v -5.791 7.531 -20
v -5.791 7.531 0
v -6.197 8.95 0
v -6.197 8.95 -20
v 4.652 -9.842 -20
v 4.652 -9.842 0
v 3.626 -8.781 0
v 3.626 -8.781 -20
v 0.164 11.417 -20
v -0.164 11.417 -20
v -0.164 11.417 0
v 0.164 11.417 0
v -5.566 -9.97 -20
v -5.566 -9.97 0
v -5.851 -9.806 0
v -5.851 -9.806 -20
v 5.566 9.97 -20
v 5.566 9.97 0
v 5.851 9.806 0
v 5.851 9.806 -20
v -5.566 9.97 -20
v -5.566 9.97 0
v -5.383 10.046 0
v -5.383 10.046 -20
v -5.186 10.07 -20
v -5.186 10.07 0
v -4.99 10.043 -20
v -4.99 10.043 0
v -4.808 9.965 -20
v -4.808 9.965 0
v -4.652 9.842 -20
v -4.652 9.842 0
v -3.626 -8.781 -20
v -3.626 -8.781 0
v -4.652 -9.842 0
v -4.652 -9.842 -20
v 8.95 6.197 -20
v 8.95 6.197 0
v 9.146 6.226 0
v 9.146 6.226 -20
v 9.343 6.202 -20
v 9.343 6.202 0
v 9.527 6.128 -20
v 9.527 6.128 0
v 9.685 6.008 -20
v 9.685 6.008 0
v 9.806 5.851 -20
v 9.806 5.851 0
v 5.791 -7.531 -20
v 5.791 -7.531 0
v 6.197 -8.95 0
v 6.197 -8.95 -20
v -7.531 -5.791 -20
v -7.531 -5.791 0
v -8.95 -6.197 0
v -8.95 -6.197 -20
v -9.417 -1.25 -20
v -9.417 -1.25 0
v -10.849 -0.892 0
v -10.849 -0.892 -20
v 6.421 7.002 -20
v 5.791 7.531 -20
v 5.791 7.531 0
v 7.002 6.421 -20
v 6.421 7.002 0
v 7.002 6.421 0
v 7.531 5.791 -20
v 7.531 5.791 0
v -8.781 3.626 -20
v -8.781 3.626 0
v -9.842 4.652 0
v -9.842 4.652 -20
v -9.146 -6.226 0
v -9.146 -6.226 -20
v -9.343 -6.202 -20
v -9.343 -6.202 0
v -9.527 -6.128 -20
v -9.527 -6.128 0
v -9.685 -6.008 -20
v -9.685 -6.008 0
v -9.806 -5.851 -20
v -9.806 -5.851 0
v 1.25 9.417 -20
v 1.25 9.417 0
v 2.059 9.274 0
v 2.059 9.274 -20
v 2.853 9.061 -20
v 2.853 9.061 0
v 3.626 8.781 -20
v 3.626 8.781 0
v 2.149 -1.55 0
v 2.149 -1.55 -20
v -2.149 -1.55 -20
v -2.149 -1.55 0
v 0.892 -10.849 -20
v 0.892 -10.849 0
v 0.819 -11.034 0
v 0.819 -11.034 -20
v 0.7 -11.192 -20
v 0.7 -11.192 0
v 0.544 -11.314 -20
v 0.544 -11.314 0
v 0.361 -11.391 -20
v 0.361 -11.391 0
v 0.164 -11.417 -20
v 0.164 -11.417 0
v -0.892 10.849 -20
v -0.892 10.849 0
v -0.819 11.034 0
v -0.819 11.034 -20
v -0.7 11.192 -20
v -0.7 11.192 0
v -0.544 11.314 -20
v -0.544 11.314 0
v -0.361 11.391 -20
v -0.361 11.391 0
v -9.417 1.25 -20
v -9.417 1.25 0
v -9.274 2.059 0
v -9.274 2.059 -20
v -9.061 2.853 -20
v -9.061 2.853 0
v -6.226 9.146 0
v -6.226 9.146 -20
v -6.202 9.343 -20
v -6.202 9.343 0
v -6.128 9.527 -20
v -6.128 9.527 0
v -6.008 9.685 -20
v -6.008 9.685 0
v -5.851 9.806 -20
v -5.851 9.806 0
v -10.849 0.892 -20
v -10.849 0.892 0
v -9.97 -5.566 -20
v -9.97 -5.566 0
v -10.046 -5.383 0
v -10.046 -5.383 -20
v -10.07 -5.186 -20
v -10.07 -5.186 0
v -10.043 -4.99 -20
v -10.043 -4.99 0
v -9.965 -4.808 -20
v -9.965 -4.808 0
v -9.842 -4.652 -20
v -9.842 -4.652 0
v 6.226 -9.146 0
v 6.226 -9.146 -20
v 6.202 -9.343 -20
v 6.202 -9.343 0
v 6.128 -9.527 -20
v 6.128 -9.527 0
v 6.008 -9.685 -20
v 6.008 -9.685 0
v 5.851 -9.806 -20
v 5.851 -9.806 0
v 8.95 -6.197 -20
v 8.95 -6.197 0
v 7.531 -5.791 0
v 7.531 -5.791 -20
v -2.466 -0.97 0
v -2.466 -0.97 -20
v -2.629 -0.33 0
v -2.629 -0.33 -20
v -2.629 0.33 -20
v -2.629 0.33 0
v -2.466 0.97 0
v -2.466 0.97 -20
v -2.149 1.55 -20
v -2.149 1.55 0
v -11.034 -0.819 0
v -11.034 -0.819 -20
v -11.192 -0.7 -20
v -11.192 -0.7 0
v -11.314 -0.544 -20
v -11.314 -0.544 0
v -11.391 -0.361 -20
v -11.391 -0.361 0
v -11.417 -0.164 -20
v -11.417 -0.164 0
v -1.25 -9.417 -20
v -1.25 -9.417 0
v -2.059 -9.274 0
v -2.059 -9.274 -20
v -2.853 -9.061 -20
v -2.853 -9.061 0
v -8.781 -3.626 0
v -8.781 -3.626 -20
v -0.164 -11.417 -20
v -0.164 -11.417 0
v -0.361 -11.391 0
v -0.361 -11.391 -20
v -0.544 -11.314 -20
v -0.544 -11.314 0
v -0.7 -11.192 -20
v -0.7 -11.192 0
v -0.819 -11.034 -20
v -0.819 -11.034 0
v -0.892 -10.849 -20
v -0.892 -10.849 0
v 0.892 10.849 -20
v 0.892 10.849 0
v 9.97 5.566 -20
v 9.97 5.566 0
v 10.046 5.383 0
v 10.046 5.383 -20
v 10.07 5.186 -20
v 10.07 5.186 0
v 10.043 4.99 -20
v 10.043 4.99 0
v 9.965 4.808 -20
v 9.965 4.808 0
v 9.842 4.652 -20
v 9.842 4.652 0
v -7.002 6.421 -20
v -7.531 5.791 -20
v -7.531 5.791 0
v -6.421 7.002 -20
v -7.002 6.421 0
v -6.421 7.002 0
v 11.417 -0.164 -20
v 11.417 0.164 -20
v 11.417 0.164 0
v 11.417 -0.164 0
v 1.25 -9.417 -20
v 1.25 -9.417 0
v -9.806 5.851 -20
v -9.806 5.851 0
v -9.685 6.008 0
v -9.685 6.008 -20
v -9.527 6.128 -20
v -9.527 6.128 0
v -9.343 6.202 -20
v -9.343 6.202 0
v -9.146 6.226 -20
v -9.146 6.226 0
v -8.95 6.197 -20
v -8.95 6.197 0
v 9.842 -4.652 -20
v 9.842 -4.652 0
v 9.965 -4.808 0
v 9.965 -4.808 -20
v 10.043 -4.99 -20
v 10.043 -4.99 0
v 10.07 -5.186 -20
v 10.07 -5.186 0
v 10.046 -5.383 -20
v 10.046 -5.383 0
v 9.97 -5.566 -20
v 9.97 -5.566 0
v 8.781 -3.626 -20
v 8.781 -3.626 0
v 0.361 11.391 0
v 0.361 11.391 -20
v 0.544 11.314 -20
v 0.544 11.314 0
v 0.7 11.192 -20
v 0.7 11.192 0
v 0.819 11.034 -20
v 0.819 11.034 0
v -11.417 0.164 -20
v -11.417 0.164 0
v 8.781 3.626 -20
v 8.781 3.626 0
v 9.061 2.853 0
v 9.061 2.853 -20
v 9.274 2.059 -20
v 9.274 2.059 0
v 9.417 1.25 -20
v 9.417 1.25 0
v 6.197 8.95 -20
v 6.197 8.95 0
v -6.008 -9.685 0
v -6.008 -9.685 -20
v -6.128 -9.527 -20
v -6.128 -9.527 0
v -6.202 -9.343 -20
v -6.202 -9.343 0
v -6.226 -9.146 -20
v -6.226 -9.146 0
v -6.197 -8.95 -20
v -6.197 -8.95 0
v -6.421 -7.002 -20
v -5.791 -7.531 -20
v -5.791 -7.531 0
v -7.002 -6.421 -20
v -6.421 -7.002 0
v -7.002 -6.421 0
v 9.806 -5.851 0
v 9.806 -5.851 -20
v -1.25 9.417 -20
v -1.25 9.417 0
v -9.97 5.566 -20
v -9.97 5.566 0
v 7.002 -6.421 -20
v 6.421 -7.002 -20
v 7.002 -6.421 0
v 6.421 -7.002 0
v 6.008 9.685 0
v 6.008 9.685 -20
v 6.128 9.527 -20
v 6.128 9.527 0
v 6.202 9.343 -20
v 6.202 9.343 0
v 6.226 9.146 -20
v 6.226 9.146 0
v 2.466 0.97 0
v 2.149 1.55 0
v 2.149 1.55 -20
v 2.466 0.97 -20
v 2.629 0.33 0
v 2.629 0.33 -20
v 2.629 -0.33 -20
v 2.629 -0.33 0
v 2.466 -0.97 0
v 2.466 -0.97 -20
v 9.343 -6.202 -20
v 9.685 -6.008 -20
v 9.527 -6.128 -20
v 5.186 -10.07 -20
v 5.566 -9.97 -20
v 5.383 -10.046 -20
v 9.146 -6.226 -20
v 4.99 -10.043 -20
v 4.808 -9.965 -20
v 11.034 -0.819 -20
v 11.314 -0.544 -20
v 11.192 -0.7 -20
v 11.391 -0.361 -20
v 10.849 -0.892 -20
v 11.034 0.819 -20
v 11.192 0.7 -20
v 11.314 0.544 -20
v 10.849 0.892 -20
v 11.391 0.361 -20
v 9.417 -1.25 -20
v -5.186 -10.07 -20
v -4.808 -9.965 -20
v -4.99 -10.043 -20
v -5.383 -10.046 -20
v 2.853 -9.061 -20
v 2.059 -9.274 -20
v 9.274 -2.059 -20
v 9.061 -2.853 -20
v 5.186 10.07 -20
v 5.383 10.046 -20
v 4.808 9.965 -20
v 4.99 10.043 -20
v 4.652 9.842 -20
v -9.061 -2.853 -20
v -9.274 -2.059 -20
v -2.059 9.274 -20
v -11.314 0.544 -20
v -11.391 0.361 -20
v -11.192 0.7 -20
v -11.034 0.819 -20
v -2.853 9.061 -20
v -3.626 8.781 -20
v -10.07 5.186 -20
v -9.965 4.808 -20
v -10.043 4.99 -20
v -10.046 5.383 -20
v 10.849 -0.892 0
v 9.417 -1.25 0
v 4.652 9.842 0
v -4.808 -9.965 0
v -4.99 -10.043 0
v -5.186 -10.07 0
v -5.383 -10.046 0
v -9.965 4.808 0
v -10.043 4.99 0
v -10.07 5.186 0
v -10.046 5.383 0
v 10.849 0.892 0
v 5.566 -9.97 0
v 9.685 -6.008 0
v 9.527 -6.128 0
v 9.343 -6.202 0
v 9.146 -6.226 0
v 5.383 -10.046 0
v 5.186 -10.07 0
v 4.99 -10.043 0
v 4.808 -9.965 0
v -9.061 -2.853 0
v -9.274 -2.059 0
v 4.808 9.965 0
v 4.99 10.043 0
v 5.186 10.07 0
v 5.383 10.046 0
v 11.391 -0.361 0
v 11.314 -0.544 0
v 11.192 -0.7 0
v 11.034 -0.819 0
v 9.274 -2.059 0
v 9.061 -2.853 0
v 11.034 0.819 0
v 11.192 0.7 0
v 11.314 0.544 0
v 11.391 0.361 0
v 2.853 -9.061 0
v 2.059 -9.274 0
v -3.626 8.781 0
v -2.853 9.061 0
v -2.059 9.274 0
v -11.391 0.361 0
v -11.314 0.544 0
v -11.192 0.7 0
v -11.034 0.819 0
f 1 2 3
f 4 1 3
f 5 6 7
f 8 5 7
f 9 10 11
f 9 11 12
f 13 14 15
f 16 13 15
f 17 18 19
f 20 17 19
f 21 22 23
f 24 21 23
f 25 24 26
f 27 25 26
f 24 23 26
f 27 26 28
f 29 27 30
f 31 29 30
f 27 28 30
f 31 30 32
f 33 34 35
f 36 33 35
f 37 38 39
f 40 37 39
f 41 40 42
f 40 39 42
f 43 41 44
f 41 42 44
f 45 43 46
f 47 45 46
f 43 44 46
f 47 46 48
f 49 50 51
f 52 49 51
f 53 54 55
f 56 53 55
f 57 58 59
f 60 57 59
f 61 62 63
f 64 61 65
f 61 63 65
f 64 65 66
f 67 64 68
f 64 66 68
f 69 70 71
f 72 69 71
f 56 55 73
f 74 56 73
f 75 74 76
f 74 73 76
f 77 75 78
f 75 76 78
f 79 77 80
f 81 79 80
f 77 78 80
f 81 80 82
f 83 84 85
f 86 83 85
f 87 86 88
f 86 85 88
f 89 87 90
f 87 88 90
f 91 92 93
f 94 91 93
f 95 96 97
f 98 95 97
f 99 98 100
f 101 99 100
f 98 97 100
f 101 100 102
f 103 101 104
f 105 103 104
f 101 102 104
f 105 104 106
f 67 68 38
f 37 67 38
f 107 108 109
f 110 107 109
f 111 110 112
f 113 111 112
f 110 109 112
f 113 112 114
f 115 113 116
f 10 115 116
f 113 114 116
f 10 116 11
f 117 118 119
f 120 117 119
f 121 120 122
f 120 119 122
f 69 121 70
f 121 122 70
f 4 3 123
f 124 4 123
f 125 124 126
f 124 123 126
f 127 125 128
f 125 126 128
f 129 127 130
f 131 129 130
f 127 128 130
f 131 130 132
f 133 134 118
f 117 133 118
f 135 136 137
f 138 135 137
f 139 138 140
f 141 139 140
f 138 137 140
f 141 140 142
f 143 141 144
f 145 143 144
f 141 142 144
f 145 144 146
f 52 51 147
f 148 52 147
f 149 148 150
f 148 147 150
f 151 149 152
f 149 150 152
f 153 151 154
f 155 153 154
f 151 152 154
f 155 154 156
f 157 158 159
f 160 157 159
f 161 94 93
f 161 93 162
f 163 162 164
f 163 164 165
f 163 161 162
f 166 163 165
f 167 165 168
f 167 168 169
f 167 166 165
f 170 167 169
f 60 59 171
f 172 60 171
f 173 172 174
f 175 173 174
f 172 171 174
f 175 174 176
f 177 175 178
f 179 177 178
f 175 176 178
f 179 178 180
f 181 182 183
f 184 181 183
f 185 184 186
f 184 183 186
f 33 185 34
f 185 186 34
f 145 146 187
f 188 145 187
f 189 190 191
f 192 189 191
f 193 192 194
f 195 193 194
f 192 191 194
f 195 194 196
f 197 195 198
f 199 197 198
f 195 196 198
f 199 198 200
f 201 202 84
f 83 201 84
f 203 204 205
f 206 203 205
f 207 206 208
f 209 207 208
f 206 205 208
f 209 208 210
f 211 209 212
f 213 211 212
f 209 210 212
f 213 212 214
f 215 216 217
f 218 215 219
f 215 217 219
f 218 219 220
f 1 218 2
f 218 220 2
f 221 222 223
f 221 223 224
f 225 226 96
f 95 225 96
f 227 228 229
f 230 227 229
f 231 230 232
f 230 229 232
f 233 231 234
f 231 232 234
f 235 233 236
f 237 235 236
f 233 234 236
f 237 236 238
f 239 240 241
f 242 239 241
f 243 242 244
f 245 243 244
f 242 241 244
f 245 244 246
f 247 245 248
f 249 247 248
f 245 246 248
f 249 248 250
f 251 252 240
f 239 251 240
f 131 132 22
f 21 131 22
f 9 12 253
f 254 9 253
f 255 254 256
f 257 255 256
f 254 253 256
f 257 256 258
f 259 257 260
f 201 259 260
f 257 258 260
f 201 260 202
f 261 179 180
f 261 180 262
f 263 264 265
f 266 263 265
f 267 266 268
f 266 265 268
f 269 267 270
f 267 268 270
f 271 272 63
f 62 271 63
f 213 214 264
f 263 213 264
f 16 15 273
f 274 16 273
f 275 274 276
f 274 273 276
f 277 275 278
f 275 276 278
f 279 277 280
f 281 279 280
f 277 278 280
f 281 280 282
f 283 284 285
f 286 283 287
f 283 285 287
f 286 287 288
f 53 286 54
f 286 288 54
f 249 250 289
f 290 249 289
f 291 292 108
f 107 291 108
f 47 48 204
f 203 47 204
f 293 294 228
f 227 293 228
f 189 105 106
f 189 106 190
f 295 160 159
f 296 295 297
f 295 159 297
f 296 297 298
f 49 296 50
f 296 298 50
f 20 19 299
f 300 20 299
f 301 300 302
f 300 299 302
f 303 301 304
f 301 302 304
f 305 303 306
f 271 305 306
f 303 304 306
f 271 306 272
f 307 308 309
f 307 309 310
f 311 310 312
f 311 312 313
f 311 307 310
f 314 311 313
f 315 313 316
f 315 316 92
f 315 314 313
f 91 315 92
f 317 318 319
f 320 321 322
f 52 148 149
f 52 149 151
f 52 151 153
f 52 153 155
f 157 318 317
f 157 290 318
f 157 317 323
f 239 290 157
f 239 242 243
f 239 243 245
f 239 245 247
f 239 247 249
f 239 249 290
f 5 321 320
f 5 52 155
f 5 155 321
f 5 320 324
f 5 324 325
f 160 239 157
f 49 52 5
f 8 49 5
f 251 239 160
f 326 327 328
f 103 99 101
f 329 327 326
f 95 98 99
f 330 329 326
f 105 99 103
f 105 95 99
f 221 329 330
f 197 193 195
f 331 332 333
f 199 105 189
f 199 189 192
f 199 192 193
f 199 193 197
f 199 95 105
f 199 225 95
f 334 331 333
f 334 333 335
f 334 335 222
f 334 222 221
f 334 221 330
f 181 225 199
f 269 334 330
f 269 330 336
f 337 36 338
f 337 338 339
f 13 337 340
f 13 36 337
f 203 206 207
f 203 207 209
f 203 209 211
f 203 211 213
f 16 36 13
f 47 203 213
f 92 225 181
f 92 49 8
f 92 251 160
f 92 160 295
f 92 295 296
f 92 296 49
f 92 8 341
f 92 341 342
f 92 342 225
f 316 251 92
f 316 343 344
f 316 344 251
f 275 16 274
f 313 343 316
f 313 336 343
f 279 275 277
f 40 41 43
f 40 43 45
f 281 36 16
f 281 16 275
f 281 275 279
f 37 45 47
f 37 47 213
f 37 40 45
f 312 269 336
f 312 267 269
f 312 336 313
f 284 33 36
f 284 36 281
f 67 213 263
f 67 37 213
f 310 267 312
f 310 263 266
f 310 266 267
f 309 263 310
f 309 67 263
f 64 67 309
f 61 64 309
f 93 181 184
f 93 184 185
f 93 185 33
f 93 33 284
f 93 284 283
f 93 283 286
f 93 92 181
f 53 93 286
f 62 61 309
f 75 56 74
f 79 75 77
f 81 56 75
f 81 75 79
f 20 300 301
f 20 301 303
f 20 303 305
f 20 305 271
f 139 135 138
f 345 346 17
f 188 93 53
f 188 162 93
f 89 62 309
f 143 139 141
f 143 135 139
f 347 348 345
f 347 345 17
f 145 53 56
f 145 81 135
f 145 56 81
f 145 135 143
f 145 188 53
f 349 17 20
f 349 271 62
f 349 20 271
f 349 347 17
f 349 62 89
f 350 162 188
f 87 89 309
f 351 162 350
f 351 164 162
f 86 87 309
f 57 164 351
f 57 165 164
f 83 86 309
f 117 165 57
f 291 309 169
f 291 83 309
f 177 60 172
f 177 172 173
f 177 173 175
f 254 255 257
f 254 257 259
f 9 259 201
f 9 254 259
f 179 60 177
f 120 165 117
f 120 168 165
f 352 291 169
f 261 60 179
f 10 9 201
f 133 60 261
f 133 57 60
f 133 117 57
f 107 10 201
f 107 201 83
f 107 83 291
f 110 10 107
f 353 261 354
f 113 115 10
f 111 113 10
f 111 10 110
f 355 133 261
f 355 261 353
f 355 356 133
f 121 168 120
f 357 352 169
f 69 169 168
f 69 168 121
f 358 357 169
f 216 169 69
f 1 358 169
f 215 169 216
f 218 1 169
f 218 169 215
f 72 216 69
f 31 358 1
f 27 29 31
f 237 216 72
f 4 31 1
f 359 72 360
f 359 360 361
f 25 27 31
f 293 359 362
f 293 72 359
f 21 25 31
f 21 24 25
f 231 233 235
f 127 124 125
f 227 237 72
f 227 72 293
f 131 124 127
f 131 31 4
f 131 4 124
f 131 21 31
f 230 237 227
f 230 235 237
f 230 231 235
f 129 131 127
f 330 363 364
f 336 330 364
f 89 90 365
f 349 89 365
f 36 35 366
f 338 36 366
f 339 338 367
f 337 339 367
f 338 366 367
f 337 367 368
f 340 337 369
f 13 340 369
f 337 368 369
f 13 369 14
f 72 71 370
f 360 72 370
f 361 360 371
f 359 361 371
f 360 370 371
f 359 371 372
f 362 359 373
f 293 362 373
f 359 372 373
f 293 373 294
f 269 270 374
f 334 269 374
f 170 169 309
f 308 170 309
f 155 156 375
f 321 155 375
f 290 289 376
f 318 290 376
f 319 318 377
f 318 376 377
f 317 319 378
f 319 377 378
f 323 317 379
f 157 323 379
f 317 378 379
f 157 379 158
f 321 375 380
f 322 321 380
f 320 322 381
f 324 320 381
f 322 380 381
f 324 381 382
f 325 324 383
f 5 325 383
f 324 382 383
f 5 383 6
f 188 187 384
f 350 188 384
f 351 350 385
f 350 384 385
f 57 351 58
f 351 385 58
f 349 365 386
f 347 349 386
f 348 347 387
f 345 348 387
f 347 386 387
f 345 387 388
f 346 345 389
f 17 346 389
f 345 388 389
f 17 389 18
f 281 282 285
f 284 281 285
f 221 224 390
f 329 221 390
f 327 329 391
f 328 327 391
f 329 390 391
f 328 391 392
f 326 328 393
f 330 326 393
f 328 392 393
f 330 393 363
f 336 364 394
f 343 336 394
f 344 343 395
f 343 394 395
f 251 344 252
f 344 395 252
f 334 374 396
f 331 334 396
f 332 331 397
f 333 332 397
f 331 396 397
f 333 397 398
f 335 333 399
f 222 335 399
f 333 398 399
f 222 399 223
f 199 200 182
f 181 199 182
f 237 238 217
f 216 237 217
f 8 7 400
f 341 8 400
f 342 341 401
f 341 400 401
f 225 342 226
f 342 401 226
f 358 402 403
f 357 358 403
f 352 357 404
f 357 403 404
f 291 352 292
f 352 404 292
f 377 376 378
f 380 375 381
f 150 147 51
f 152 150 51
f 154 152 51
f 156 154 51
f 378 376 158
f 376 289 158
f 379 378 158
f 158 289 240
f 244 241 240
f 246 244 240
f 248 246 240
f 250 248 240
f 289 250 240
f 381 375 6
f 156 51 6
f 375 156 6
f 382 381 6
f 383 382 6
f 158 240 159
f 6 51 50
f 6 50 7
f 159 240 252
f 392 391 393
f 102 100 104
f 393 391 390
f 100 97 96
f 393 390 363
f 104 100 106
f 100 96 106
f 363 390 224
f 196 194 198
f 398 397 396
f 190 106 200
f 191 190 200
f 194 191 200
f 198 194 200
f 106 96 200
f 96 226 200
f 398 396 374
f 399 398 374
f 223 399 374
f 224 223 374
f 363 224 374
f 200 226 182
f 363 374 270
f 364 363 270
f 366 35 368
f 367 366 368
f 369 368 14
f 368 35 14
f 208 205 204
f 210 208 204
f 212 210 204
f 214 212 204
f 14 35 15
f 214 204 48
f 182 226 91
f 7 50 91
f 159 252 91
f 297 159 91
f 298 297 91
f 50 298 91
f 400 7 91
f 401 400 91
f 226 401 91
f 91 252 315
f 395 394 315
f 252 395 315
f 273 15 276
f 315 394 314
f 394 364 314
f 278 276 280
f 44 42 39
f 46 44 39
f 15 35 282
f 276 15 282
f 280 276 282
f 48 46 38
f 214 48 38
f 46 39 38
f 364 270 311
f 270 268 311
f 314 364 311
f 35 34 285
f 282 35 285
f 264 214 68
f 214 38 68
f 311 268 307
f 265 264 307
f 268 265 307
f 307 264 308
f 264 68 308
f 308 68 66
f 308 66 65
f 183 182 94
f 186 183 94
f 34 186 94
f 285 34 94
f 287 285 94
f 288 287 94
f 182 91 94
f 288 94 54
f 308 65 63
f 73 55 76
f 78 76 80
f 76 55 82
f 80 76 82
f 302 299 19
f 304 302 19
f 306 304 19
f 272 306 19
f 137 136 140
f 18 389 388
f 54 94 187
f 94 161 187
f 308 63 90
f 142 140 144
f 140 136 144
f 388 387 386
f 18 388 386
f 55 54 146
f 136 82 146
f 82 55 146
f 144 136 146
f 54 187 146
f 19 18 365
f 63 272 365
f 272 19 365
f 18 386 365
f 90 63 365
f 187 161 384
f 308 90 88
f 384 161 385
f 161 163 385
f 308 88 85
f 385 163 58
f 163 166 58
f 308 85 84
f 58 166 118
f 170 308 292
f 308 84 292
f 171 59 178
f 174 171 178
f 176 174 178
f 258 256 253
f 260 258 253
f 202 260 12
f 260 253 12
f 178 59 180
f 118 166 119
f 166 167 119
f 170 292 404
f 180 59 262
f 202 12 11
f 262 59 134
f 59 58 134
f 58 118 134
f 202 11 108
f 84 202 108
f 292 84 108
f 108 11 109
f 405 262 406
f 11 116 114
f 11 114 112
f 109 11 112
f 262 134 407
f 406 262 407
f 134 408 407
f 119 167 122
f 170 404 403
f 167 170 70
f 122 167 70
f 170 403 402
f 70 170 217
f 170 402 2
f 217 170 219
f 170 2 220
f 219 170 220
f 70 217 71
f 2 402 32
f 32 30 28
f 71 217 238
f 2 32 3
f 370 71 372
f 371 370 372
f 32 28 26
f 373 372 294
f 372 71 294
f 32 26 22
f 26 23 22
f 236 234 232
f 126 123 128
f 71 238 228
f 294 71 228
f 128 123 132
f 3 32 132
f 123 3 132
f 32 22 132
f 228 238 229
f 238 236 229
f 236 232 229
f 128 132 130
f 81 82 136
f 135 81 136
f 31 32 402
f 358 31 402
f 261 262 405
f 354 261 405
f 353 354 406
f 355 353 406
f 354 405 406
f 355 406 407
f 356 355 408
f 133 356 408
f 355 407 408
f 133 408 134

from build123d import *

# Parameters (mm, degrees)
Y_KSEKLIK_EKSTR_ZYON1_DEPTH = 20
IZIM2_R                     = 5
KES_EKSTR_ZYON1_DEPTH       = 15
IZIM3_R                     = 7.433299963
Y_KSEKLIK_EKSTR_ZYON2_DEPTH = 15
Y_KSEKLIK_EKSTR_ZYON3_DEPTH = 20
KES_EKSTR_ZYON2_DEPTH       = 20


with BuildPart() as part:
    # Çizim1 → Yükseklik-Ekstrüzyon1 (new body)
    with BuildSketch(Plane.XY):
        with BuildLine():
            Line((-1.25, 9.417404101), (-0.89202457, 10.84930582))
            ThreePointArc((-0.89202457, 10.84930582), (-0.625976852, 11.258558179), (-0.164417695, 11.417404101))
            Line((-0.164417695, 11.417404101), (0.164417695, 11.417404101))
            ThreePointArc((0.164417695, 11.417404101), (0.625976852, 11.258558179), (0.89202457, 10.84930582))
            Line((0.89202457, 10.84930582), (1.25, 9.417404101))
            ThreePointArc((1.25, 9.417404101), (2.458780928, 9.17629535), (3.626170296, 8.780711189))
            Line((3.626170296, 8.780711189), (4.652136971, 9.841786738))
            ThreePointArc((4.652136971, 9.841786738), (5.087167233, 10.063185819), (5.56631215, 9.969970844))
            Line((5.56631215, 9.969970844), (5.851091951, 9.805553149))
            ThreePointArc((5.851091951, 9.805553149), (6.171390946, 9.437208967), (6.197168849, 8.949762168))
            Line((6.197168849, 8.949762168), (5.791233805, 7.530711189))
            ThreePointArc((5.791233805, 7.530711189), (6.717514421, 6.717514421), (7.530711189, 5.791233805))
            Line((7.530711189, 5.791233805), (8.949762168, 6.197168849))
            ThreePointArc((8.949762168, 6.197168849), (9.437208967, 6.171390946), (9.805553149, 5.851091951))
            Line((9.805553149, 5.851091951), (9.969970844, 5.56631215))
            ThreePointArc((9.969970844, 5.56631215), (10.063185819, 5.087167233), (9.841786738, 4.652136971))
            Line((9.841786738, 4.652136971), (8.780711189, 3.626170296))
            ThreePointArc((8.780711189, 3.626170296), (9.17629535, 2.458780928), (9.417404101, 1.25))
            Line((9.417404101, 1.25), (10.84930582, 0.89202457))
            ThreePointArc((10.84930582, 0.89202457), (11.258558179, 0.625976852), (11.417404101, 0.164417695))
            Line((11.417404101, 0.164417695), (11.417404101, -0.164417695))
            ThreePointArc((11.417404101, -0.164417695), (11.258558179, -0.625976852), (10.84930582, -0.89202457))
            Line((10.84930582, -0.89202457), (9.417404101, -1.25))
            ThreePointArc((9.417404101, -1.25), (9.17629535, -2.458780928), (8.780711189, -3.626170296))
            Line((8.780711189, -3.626170296), (9.841786738, -4.652136971))
            ThreePointArc((9.841786738, -4.652136971), (10.063185819, -5.087167233), (9.969970844, -5.56631215))
            Line((9.969970844, -5.56631215), (9.805553149, -5.851091951))
            ThreePointArc((9.805553149, -5.851091951), (9.437208967, -6.171390946), (8.949762168, -6.197168849))
            Line((8.949762168, -6.197168849), (7.530711189, -5.791233805))
            ThreePointArc((7.530711189, -5.791233805), (6.717514421, -6.717514421), (5.791233805, -7.530711189))
            Line((5.791233805, -7.530711189), (6.197168849, -8.949762168))
            ThreePointArc((6.197168849, -8.949762168), (6.171390946, -9.437208967), (5.851091951, -9.805553149))
            Line((5.851091951, -9.805553149), (5.56631215, -9.969970844))
            ThreePointArc((5.56631215, -9.969970844), (5.087167233, -10.063185819), (4.652136971, -9.841786738))
            Line((4.652136971, -9.841786738), (3.626170296, -8.780711189))
            ThreePointArc((3.626170296, -8.780711189), (2.458780928, -9.17629535), (1.25, -9.417404101))
            Line((1.25, -9.417404101), (0.89202457, -10.84930582))
            ThreePointArc((0.89202457, -10.84930582), (0.625976852, -11.258558179), (0.164417695, -11.417404101))
            Line((0.164417695, -11.417404101), (-0.164417695, -11.417404101))
            ThreePointArc((-0.164417695, -11.417404101), (-0.625976852, -11.258558179), (-0.89202457, -10.84930582))
            Line((-0.89202457, -10.84930582), (-1.25, -9.417404101))
            ThreePointArc((-1.25, -9.417404101), (-2.458780928, -9.17629535), (-3.626170296, -8.780711189))
            Line((-3.626170296, -8.780711189), (-4.652136971, -9.841786738))
            ThreePointArc((-4.652136971, -9.841786738), (-5.087167233, -10.063185819), (-5.56631215, -9.969970844))
            Line((-5.56631215, -9.969970844), (-5.851091951, -9.805553149))
            ThreePointArc((-5.851091951, -9.805553149), (-6.171390946, -9.437208967), (-6.197168849, -8.949762168))
            Line((-6.197168849, -8.949762168), (-5.791233805, -7.530711189))
            ThreePointArc((-5.791233805, -7.530711189), (-6.717514421, -6.717514421), (-7.530711189, -5.791233805))
            Line((-7.530711189, -5.791233805), (-8.949762168, -6.197168849))
            ThreePointArc((-8.949762168, -6.197168849), (-9.437208967, -6.171390946), (-9.805553149, -5.851091951))
            Line((-9.805553149, -5.851091951), (-9.969970844, -5.56631215))
            ThreePointArc((-9.969970844, -5.56631215), (-10.063185819, -5.087167233), (-9.841786738, -4.652136971))
            Line((-9.841786738, -4.652136971), (-8.780711189, -3.626170296))
            ThreePointArc((-8.780711189, -3.626170296), (-9.17629535, -2.458780928), (-9.417404101, -1.25))
            Line((-9.417404101, -1.25), (-10.84930582, -0.89202457))
            ThreePointArc((-10.84930582, -0.89202457), (-11.258558179, -0.625976852), (-11.417404101, -0.164417695))
            Line((-11.417404101, -0.164417695), (-11.417404101, 0.164417695))
            ThreePointArc((-11.417404101, 0.164417695), (-11.258558179, 0.625976852), (-10.84930582, 0.89202457))
            Line((-10.84930582, 0.89202457), (-9.417404101, 1.25))
            ThreePointArc((-9.417404101, 1.25), (-9.17629535, 2.458780928), (-8.780711189, 3.626170296))
            Line((-8.780711189, 3.626170296), (-9.841786738, 4.652136971))
            ThreePointArc((-9.841786738, 4.652136971), (-10.063185819, 5.087167233), (-9.969970844, 5.56631215))
            Line((-9.969970844, 5.56631215), (-9.805553149, 5.851091951))
            ThreePointArc((-9.805553149, 5.851091951), (-9.437208967, 6.171390946), (-8.949762168, 6.197168849))
            Line((-8.949762168, 6.197168849), (-7.530711189, 5.791233805))
            ThreePointArc((-7.530711189, 5.791233805), (-6.717514421, 6.717514421), (-5.791233805, 7.530711189))
            Line((-5.791233805, 7.530711189), (-6.197168849, 8.949762168))
            ThreePointArc((-6.197168849, 8.949762168), (-6.171390946, 9.437208967), (-5.851091951, 9.805553149))
            Line((-5.851091951, 9.805553149), (-5.56631215, 9.969970844))
            ThreePointArc((-5.56631215, 9.969970844), (-5.087167233, 10.063185819), (-4.652136971, 9.841786738))
            Line((-4.652136971, 9.841786738), (-3.626170296, 8.780711189))
            ThreePointArc((-3.626170296, 8.780711189), (-2.458780928, 9.17629535), (-1.25, 9.417404101))
        make_face()
    extrude(amount=-Y_KSEKLIK_EKSTR_ZYON1_DEPTH)

    # Çizim2 → Kes-Ekstrüzyon1 (cut)
    with BuildSketch(Plane(origin=(0, 0, -20), x_dir=(-1, 0, 0), z_dir=(0, 0, -1))):
        Circle(IZIM2_R)
    extrude(amount=-KES_EKSTR_ZYON1_DEPTH, mode=Mode.SUBTRACT)

    # Çizim3 → Yükseklik-Ekstrüzyon2 (add)
    with BuildSketch(Plane(origin=(0, 0, -20), x_dir=(-1, 0, 0), z_dir=(0, 0, -1))):
        Circle(IZIM3_R)
        with BuildLine():
            Line((-2.154065923, 2.5), (2.154065923, 2.5))
            ThreePointArc((2.154065923, 2.5), (0, -3.3), (-2.154065923, 2.5))
        make_face(mode=Mode.SUBTRACT)
    extrude(amount=-Y_KSEKLIK_EKSTR_ZYON2_DEPTH)

    # Çizim1<2> → Yükseklik-Ekstrüzyon3 (add)
    with BuildSketch(Plane.XY):
        with BuildLine():
            Line((-1.25, 9.417404101), (-0.89202457, 10.84930582))
            ThreePointArc((-0.89202457, 10.84930582), (-0.625976852, 11.258558179), (-0.164417695, 11.417404101))
            Line((-0.164417695, 11.417404101), (0.164417695, 11.417404101))
            ThreePointArc((0.164417695, 11.417404101), (0.625976852, 11.258558179), (0.89202457, 10.84930582))
            Line((0.89202457, 10.84930582), (1.25, 9.417404101))
            ThreePointArc((1.25, 9.417404101), (2.458780928, 9.17629535), (3.626170296, 8.780711189))
            Line((3.626170296, 8.780711189), (4.652136971, 9.841786738))
            ThreePointArc((4.652136971, 9.841786738), (5.087167233, 10.063185819), (5.56631215, 9.969970844))
            Line((5.56631215, 9.969970844), (5.851091951, 9.805553149))
            ThreePointArc((5.851091951, 9.805553149), (6.171390946, 9.437208967), (6.197168849, 8.949762168))
            Line((6.197168849, 8.949762168), (5.791233805, 7.530711189))
            ThreePointArc((5.791233805, 7.530711189), (6.717514421, 6.717514421), (7.530711189, 5.791233805))
            Line((7.530711189, 5.791233805), (8.949762168, 6.197168849))
            ThreePointArc((8.949762168, 6.197168849), (9.437208967, 6.171390946), (9.805553149, 5.851091951))
            Line((9.805553149, 5.851091951), (9.969970844, 5.56631215))
            ThreePointArc((9.969970844, 5.56631215), (10.063185819, 5.087167233), (9.841786738, 4.652136971))
            Line((9.841786738, 4.652136971), (8.780711189, 3.626170296))
            ThreePointArc((8.780711189, 3.626170296), (9.17629535, 2.458780928), (9.417404101, 1.25))
            Line((9.417404101, 1.25), (10.84930582, 0.89202457))
            ThreePointArc((10.84930582, 0.89202457), (11.258558179, 0.625976852), (11.417404101, 0.164417695))
            Line((11.417404101, 0.164417695), (11.417404101, -0.164417695))
            ThreePointArc((11.417404101, -0.164417695), (11.258558179, -0.625976852), (10.84930582, -0.89202457))
            Line((10.84930582, -0.89202457), (9.417404101, -1.25))
            ThreePointArc((9.417404101, -1.25), (9.17629535, -2.458780928), (8.780711189, -3.626170296))
            Line((8.780711189, -3.626170296), (9.841786738, -4.652136971))
            ThreePointArc((9.841786738, -4.652136971), (10.063185819, -5.087167233), (9.969970844, -5.56631215))
            Line((9.969970844, -5.56631215), (9.805553149, -5.851091951))
            ThreePointArc((9.805553149, -5.851091951), (9.437208967, -6.171390946), (8.949762168, -6.197168849))
            Line((8.949762168, -6.197168849), (7.530711189, -5.791233805))
            ThreePointArc((7.530711189, -5.791233805), (6.717514421, -6.717514421), (5.791233805, -7.530711189))
            Line((5.791233805, -7.530711189), (6.197168849, -8.949762168))
            ThreePointArc((6.197168849, -8.949762168), (6.171390946, -9.437208967), (5.851091951, -9.805553149))
            Line((5.851091951, -9.805553149), (5.56631215, -9.969970844))
            ThreePointArc((5.56631215, -9.969970844), (5.087167233, -10.063185819), (4.652136971, -9.841786738))
            Line((4.652136971, -9.841786738), (3.626170296, -8.780711189))
            ThreePointArc((3.626170296, -8.780711189), (2.458780928, -9.17629535), (1.25, -9.417404101))
            Line((1.25, -9.417404101), (0.89202457, -10.84930582))
            ThreePointArc((0.89202457, -10.84930582), (0.625976852, -11.258558179), (0.164417695, -11.417404101))
            Line((0.164417695, -11.417404101), (-0.164417695, -11.417404101))
            ThreePointArc((-0.164417695, -11.417404101), (-0.625976852, -11.258558179), (-0.89202457, -10.84930582))
            Line((-0.89202457, -10.84930582), (-1.25, -9.417404101))
            ThreePointArc((-1.25, -9.417404101), (-2.458780928, -9.17629535), (-3.626170296, -8.780711189))
            Line((-3.626170296, -8.780711189), (-4.652136971, -9.841786738))
            ThreePointArc((-4.652136971, -9.841786738), (-5.087167233, -10.063185819), (-5.56631215, -9.969970844))
            Line((-5.56631215, -9.969970844), (-5.851091951, -9.805553149))
            ThreePointArc((-5.851091951, -9.805553149), (-6.171390946, -9.437208967), (-6.197168849, -8.949762168))
            Line((-6.197168849, -8.949762168), (-5.791233805, -7.530711189))
            ThreePointArc((-5.791233805, -7.530711189), (-6.717514421, -6.717514421), (-7.530711189, -5.791233805))
            Line((-7.530711189, -5.791233805), (-8.949762168, -6.197168849))
            ThreePointArc((-8.949762168, -6.197168849), (-9.437208967, -6.171390946), (-9.805553149, -5.851091951))
            Line((-9.805553149, -5.851091951), (-9.969970844, -5.56631215))
            ThreePointArc((-9.969970844, -5.56631215), (-10.063185819, -5.087167233), (-9.841786738, -4.652136971))
            Line((-9.841786738, -4.652136971), (-8.780711189, -3.626170296))
            ThreePointArc((-8.780711189, -3.626170296), (-9.17629535, -2.458780928), (-9.417404101, -1.25))
            Line((-9.417404101, -1.25), (-10.84930582, -0.89202457))
            ThreePointArc((-10.84930582, -0.89202457), (-11.258558179, -0.625976852), (-11.417404101, -0.164417695))
            Line((-11.417404101, -0.164417695), (-11.417404101, 0.164417695))
            ThreePointArc((-11.417404101, 0.164417695), (-11.258558179, 0.625976852), (-10.84930582, 0.89202457))
            Line((-10.84930582, 0.89202457), (-9.417404101, 1.25))
            ThreePointArc((-9.417404101, 1.25), (-9.17629535, 2.458780928), (-8.780711189, 3.626170296))
            Line((-8.780711189, 3.626170296), (-9.841786738, 4.652136971))
            ThreePointArc((-9.841786738, 4.652136971), (-10.063185819, 5.087167233), (-9.969970844, 5.56631215))
            Line((-9.969970844, 5.56631215), (-9.805553149, 5.851091951))
            ThreePointArc((-9.805553149, 5.851091951), (-9.437208967, 6.171390946), (-8.949762168, 6.197168849))
            Line((-8.949762168, 6.197168849), (-7.530711189, 5.791233805))
            ThreePointArc((-7.530711189, 5.791233805), (-6.717514421, 6.717514421), (-5.791233805, 7.530711189))
            Line((-5.791233805, 7.530711189), (-6.197168849, 8.949762168))
            ThreePointArc((-6.197168849, 8.949762168), (-6.171390946, 9.437208967), (-5.851091951, 9.805553149))
            Line((-5.851091951, 9.805553149), (-5.56631215, 9.969970844))
            ThreePointArc((-5.56631215, 9.969970844), (-5.087167233, 10.063185819), (-4.652136971, 9.841786738))
            Line((-4.652136971, 9.841786738), (-3.626170296, 8.780711189))
            ThreePointArc((-3.626170296, 8.780711189), (-2.458780928, 9.17629535), (-1.25, 9.417404101))
        make_face()
    extrude(amount=-Y_KSEKLIK_EKSTR_ZYON3_DEPTH)

    # Çizim4 → Kes-Ekstrüzyon2 (cut)
    with BuildSketch(Plane.XY):
        with BuildLine():
            Line((-2.149418526, 1.55), (2.149418526, 1.55))
            ThreePointArc((2.149418526, 1.55), (2.65, 0), (2.149418526, -1.55))
            Line((2.149418526, -1.55), (-2.149418526, -1.55))
            ThreePointArc((-2.149418526, -1.55), (-2.65, 0), (-2.149418526, 1.55))
        make_face()
    extrude(amount=-KES_EKSTR_ZYON2_DEPTH, mode=Mode.SUBTRACT)


solid = part.part
